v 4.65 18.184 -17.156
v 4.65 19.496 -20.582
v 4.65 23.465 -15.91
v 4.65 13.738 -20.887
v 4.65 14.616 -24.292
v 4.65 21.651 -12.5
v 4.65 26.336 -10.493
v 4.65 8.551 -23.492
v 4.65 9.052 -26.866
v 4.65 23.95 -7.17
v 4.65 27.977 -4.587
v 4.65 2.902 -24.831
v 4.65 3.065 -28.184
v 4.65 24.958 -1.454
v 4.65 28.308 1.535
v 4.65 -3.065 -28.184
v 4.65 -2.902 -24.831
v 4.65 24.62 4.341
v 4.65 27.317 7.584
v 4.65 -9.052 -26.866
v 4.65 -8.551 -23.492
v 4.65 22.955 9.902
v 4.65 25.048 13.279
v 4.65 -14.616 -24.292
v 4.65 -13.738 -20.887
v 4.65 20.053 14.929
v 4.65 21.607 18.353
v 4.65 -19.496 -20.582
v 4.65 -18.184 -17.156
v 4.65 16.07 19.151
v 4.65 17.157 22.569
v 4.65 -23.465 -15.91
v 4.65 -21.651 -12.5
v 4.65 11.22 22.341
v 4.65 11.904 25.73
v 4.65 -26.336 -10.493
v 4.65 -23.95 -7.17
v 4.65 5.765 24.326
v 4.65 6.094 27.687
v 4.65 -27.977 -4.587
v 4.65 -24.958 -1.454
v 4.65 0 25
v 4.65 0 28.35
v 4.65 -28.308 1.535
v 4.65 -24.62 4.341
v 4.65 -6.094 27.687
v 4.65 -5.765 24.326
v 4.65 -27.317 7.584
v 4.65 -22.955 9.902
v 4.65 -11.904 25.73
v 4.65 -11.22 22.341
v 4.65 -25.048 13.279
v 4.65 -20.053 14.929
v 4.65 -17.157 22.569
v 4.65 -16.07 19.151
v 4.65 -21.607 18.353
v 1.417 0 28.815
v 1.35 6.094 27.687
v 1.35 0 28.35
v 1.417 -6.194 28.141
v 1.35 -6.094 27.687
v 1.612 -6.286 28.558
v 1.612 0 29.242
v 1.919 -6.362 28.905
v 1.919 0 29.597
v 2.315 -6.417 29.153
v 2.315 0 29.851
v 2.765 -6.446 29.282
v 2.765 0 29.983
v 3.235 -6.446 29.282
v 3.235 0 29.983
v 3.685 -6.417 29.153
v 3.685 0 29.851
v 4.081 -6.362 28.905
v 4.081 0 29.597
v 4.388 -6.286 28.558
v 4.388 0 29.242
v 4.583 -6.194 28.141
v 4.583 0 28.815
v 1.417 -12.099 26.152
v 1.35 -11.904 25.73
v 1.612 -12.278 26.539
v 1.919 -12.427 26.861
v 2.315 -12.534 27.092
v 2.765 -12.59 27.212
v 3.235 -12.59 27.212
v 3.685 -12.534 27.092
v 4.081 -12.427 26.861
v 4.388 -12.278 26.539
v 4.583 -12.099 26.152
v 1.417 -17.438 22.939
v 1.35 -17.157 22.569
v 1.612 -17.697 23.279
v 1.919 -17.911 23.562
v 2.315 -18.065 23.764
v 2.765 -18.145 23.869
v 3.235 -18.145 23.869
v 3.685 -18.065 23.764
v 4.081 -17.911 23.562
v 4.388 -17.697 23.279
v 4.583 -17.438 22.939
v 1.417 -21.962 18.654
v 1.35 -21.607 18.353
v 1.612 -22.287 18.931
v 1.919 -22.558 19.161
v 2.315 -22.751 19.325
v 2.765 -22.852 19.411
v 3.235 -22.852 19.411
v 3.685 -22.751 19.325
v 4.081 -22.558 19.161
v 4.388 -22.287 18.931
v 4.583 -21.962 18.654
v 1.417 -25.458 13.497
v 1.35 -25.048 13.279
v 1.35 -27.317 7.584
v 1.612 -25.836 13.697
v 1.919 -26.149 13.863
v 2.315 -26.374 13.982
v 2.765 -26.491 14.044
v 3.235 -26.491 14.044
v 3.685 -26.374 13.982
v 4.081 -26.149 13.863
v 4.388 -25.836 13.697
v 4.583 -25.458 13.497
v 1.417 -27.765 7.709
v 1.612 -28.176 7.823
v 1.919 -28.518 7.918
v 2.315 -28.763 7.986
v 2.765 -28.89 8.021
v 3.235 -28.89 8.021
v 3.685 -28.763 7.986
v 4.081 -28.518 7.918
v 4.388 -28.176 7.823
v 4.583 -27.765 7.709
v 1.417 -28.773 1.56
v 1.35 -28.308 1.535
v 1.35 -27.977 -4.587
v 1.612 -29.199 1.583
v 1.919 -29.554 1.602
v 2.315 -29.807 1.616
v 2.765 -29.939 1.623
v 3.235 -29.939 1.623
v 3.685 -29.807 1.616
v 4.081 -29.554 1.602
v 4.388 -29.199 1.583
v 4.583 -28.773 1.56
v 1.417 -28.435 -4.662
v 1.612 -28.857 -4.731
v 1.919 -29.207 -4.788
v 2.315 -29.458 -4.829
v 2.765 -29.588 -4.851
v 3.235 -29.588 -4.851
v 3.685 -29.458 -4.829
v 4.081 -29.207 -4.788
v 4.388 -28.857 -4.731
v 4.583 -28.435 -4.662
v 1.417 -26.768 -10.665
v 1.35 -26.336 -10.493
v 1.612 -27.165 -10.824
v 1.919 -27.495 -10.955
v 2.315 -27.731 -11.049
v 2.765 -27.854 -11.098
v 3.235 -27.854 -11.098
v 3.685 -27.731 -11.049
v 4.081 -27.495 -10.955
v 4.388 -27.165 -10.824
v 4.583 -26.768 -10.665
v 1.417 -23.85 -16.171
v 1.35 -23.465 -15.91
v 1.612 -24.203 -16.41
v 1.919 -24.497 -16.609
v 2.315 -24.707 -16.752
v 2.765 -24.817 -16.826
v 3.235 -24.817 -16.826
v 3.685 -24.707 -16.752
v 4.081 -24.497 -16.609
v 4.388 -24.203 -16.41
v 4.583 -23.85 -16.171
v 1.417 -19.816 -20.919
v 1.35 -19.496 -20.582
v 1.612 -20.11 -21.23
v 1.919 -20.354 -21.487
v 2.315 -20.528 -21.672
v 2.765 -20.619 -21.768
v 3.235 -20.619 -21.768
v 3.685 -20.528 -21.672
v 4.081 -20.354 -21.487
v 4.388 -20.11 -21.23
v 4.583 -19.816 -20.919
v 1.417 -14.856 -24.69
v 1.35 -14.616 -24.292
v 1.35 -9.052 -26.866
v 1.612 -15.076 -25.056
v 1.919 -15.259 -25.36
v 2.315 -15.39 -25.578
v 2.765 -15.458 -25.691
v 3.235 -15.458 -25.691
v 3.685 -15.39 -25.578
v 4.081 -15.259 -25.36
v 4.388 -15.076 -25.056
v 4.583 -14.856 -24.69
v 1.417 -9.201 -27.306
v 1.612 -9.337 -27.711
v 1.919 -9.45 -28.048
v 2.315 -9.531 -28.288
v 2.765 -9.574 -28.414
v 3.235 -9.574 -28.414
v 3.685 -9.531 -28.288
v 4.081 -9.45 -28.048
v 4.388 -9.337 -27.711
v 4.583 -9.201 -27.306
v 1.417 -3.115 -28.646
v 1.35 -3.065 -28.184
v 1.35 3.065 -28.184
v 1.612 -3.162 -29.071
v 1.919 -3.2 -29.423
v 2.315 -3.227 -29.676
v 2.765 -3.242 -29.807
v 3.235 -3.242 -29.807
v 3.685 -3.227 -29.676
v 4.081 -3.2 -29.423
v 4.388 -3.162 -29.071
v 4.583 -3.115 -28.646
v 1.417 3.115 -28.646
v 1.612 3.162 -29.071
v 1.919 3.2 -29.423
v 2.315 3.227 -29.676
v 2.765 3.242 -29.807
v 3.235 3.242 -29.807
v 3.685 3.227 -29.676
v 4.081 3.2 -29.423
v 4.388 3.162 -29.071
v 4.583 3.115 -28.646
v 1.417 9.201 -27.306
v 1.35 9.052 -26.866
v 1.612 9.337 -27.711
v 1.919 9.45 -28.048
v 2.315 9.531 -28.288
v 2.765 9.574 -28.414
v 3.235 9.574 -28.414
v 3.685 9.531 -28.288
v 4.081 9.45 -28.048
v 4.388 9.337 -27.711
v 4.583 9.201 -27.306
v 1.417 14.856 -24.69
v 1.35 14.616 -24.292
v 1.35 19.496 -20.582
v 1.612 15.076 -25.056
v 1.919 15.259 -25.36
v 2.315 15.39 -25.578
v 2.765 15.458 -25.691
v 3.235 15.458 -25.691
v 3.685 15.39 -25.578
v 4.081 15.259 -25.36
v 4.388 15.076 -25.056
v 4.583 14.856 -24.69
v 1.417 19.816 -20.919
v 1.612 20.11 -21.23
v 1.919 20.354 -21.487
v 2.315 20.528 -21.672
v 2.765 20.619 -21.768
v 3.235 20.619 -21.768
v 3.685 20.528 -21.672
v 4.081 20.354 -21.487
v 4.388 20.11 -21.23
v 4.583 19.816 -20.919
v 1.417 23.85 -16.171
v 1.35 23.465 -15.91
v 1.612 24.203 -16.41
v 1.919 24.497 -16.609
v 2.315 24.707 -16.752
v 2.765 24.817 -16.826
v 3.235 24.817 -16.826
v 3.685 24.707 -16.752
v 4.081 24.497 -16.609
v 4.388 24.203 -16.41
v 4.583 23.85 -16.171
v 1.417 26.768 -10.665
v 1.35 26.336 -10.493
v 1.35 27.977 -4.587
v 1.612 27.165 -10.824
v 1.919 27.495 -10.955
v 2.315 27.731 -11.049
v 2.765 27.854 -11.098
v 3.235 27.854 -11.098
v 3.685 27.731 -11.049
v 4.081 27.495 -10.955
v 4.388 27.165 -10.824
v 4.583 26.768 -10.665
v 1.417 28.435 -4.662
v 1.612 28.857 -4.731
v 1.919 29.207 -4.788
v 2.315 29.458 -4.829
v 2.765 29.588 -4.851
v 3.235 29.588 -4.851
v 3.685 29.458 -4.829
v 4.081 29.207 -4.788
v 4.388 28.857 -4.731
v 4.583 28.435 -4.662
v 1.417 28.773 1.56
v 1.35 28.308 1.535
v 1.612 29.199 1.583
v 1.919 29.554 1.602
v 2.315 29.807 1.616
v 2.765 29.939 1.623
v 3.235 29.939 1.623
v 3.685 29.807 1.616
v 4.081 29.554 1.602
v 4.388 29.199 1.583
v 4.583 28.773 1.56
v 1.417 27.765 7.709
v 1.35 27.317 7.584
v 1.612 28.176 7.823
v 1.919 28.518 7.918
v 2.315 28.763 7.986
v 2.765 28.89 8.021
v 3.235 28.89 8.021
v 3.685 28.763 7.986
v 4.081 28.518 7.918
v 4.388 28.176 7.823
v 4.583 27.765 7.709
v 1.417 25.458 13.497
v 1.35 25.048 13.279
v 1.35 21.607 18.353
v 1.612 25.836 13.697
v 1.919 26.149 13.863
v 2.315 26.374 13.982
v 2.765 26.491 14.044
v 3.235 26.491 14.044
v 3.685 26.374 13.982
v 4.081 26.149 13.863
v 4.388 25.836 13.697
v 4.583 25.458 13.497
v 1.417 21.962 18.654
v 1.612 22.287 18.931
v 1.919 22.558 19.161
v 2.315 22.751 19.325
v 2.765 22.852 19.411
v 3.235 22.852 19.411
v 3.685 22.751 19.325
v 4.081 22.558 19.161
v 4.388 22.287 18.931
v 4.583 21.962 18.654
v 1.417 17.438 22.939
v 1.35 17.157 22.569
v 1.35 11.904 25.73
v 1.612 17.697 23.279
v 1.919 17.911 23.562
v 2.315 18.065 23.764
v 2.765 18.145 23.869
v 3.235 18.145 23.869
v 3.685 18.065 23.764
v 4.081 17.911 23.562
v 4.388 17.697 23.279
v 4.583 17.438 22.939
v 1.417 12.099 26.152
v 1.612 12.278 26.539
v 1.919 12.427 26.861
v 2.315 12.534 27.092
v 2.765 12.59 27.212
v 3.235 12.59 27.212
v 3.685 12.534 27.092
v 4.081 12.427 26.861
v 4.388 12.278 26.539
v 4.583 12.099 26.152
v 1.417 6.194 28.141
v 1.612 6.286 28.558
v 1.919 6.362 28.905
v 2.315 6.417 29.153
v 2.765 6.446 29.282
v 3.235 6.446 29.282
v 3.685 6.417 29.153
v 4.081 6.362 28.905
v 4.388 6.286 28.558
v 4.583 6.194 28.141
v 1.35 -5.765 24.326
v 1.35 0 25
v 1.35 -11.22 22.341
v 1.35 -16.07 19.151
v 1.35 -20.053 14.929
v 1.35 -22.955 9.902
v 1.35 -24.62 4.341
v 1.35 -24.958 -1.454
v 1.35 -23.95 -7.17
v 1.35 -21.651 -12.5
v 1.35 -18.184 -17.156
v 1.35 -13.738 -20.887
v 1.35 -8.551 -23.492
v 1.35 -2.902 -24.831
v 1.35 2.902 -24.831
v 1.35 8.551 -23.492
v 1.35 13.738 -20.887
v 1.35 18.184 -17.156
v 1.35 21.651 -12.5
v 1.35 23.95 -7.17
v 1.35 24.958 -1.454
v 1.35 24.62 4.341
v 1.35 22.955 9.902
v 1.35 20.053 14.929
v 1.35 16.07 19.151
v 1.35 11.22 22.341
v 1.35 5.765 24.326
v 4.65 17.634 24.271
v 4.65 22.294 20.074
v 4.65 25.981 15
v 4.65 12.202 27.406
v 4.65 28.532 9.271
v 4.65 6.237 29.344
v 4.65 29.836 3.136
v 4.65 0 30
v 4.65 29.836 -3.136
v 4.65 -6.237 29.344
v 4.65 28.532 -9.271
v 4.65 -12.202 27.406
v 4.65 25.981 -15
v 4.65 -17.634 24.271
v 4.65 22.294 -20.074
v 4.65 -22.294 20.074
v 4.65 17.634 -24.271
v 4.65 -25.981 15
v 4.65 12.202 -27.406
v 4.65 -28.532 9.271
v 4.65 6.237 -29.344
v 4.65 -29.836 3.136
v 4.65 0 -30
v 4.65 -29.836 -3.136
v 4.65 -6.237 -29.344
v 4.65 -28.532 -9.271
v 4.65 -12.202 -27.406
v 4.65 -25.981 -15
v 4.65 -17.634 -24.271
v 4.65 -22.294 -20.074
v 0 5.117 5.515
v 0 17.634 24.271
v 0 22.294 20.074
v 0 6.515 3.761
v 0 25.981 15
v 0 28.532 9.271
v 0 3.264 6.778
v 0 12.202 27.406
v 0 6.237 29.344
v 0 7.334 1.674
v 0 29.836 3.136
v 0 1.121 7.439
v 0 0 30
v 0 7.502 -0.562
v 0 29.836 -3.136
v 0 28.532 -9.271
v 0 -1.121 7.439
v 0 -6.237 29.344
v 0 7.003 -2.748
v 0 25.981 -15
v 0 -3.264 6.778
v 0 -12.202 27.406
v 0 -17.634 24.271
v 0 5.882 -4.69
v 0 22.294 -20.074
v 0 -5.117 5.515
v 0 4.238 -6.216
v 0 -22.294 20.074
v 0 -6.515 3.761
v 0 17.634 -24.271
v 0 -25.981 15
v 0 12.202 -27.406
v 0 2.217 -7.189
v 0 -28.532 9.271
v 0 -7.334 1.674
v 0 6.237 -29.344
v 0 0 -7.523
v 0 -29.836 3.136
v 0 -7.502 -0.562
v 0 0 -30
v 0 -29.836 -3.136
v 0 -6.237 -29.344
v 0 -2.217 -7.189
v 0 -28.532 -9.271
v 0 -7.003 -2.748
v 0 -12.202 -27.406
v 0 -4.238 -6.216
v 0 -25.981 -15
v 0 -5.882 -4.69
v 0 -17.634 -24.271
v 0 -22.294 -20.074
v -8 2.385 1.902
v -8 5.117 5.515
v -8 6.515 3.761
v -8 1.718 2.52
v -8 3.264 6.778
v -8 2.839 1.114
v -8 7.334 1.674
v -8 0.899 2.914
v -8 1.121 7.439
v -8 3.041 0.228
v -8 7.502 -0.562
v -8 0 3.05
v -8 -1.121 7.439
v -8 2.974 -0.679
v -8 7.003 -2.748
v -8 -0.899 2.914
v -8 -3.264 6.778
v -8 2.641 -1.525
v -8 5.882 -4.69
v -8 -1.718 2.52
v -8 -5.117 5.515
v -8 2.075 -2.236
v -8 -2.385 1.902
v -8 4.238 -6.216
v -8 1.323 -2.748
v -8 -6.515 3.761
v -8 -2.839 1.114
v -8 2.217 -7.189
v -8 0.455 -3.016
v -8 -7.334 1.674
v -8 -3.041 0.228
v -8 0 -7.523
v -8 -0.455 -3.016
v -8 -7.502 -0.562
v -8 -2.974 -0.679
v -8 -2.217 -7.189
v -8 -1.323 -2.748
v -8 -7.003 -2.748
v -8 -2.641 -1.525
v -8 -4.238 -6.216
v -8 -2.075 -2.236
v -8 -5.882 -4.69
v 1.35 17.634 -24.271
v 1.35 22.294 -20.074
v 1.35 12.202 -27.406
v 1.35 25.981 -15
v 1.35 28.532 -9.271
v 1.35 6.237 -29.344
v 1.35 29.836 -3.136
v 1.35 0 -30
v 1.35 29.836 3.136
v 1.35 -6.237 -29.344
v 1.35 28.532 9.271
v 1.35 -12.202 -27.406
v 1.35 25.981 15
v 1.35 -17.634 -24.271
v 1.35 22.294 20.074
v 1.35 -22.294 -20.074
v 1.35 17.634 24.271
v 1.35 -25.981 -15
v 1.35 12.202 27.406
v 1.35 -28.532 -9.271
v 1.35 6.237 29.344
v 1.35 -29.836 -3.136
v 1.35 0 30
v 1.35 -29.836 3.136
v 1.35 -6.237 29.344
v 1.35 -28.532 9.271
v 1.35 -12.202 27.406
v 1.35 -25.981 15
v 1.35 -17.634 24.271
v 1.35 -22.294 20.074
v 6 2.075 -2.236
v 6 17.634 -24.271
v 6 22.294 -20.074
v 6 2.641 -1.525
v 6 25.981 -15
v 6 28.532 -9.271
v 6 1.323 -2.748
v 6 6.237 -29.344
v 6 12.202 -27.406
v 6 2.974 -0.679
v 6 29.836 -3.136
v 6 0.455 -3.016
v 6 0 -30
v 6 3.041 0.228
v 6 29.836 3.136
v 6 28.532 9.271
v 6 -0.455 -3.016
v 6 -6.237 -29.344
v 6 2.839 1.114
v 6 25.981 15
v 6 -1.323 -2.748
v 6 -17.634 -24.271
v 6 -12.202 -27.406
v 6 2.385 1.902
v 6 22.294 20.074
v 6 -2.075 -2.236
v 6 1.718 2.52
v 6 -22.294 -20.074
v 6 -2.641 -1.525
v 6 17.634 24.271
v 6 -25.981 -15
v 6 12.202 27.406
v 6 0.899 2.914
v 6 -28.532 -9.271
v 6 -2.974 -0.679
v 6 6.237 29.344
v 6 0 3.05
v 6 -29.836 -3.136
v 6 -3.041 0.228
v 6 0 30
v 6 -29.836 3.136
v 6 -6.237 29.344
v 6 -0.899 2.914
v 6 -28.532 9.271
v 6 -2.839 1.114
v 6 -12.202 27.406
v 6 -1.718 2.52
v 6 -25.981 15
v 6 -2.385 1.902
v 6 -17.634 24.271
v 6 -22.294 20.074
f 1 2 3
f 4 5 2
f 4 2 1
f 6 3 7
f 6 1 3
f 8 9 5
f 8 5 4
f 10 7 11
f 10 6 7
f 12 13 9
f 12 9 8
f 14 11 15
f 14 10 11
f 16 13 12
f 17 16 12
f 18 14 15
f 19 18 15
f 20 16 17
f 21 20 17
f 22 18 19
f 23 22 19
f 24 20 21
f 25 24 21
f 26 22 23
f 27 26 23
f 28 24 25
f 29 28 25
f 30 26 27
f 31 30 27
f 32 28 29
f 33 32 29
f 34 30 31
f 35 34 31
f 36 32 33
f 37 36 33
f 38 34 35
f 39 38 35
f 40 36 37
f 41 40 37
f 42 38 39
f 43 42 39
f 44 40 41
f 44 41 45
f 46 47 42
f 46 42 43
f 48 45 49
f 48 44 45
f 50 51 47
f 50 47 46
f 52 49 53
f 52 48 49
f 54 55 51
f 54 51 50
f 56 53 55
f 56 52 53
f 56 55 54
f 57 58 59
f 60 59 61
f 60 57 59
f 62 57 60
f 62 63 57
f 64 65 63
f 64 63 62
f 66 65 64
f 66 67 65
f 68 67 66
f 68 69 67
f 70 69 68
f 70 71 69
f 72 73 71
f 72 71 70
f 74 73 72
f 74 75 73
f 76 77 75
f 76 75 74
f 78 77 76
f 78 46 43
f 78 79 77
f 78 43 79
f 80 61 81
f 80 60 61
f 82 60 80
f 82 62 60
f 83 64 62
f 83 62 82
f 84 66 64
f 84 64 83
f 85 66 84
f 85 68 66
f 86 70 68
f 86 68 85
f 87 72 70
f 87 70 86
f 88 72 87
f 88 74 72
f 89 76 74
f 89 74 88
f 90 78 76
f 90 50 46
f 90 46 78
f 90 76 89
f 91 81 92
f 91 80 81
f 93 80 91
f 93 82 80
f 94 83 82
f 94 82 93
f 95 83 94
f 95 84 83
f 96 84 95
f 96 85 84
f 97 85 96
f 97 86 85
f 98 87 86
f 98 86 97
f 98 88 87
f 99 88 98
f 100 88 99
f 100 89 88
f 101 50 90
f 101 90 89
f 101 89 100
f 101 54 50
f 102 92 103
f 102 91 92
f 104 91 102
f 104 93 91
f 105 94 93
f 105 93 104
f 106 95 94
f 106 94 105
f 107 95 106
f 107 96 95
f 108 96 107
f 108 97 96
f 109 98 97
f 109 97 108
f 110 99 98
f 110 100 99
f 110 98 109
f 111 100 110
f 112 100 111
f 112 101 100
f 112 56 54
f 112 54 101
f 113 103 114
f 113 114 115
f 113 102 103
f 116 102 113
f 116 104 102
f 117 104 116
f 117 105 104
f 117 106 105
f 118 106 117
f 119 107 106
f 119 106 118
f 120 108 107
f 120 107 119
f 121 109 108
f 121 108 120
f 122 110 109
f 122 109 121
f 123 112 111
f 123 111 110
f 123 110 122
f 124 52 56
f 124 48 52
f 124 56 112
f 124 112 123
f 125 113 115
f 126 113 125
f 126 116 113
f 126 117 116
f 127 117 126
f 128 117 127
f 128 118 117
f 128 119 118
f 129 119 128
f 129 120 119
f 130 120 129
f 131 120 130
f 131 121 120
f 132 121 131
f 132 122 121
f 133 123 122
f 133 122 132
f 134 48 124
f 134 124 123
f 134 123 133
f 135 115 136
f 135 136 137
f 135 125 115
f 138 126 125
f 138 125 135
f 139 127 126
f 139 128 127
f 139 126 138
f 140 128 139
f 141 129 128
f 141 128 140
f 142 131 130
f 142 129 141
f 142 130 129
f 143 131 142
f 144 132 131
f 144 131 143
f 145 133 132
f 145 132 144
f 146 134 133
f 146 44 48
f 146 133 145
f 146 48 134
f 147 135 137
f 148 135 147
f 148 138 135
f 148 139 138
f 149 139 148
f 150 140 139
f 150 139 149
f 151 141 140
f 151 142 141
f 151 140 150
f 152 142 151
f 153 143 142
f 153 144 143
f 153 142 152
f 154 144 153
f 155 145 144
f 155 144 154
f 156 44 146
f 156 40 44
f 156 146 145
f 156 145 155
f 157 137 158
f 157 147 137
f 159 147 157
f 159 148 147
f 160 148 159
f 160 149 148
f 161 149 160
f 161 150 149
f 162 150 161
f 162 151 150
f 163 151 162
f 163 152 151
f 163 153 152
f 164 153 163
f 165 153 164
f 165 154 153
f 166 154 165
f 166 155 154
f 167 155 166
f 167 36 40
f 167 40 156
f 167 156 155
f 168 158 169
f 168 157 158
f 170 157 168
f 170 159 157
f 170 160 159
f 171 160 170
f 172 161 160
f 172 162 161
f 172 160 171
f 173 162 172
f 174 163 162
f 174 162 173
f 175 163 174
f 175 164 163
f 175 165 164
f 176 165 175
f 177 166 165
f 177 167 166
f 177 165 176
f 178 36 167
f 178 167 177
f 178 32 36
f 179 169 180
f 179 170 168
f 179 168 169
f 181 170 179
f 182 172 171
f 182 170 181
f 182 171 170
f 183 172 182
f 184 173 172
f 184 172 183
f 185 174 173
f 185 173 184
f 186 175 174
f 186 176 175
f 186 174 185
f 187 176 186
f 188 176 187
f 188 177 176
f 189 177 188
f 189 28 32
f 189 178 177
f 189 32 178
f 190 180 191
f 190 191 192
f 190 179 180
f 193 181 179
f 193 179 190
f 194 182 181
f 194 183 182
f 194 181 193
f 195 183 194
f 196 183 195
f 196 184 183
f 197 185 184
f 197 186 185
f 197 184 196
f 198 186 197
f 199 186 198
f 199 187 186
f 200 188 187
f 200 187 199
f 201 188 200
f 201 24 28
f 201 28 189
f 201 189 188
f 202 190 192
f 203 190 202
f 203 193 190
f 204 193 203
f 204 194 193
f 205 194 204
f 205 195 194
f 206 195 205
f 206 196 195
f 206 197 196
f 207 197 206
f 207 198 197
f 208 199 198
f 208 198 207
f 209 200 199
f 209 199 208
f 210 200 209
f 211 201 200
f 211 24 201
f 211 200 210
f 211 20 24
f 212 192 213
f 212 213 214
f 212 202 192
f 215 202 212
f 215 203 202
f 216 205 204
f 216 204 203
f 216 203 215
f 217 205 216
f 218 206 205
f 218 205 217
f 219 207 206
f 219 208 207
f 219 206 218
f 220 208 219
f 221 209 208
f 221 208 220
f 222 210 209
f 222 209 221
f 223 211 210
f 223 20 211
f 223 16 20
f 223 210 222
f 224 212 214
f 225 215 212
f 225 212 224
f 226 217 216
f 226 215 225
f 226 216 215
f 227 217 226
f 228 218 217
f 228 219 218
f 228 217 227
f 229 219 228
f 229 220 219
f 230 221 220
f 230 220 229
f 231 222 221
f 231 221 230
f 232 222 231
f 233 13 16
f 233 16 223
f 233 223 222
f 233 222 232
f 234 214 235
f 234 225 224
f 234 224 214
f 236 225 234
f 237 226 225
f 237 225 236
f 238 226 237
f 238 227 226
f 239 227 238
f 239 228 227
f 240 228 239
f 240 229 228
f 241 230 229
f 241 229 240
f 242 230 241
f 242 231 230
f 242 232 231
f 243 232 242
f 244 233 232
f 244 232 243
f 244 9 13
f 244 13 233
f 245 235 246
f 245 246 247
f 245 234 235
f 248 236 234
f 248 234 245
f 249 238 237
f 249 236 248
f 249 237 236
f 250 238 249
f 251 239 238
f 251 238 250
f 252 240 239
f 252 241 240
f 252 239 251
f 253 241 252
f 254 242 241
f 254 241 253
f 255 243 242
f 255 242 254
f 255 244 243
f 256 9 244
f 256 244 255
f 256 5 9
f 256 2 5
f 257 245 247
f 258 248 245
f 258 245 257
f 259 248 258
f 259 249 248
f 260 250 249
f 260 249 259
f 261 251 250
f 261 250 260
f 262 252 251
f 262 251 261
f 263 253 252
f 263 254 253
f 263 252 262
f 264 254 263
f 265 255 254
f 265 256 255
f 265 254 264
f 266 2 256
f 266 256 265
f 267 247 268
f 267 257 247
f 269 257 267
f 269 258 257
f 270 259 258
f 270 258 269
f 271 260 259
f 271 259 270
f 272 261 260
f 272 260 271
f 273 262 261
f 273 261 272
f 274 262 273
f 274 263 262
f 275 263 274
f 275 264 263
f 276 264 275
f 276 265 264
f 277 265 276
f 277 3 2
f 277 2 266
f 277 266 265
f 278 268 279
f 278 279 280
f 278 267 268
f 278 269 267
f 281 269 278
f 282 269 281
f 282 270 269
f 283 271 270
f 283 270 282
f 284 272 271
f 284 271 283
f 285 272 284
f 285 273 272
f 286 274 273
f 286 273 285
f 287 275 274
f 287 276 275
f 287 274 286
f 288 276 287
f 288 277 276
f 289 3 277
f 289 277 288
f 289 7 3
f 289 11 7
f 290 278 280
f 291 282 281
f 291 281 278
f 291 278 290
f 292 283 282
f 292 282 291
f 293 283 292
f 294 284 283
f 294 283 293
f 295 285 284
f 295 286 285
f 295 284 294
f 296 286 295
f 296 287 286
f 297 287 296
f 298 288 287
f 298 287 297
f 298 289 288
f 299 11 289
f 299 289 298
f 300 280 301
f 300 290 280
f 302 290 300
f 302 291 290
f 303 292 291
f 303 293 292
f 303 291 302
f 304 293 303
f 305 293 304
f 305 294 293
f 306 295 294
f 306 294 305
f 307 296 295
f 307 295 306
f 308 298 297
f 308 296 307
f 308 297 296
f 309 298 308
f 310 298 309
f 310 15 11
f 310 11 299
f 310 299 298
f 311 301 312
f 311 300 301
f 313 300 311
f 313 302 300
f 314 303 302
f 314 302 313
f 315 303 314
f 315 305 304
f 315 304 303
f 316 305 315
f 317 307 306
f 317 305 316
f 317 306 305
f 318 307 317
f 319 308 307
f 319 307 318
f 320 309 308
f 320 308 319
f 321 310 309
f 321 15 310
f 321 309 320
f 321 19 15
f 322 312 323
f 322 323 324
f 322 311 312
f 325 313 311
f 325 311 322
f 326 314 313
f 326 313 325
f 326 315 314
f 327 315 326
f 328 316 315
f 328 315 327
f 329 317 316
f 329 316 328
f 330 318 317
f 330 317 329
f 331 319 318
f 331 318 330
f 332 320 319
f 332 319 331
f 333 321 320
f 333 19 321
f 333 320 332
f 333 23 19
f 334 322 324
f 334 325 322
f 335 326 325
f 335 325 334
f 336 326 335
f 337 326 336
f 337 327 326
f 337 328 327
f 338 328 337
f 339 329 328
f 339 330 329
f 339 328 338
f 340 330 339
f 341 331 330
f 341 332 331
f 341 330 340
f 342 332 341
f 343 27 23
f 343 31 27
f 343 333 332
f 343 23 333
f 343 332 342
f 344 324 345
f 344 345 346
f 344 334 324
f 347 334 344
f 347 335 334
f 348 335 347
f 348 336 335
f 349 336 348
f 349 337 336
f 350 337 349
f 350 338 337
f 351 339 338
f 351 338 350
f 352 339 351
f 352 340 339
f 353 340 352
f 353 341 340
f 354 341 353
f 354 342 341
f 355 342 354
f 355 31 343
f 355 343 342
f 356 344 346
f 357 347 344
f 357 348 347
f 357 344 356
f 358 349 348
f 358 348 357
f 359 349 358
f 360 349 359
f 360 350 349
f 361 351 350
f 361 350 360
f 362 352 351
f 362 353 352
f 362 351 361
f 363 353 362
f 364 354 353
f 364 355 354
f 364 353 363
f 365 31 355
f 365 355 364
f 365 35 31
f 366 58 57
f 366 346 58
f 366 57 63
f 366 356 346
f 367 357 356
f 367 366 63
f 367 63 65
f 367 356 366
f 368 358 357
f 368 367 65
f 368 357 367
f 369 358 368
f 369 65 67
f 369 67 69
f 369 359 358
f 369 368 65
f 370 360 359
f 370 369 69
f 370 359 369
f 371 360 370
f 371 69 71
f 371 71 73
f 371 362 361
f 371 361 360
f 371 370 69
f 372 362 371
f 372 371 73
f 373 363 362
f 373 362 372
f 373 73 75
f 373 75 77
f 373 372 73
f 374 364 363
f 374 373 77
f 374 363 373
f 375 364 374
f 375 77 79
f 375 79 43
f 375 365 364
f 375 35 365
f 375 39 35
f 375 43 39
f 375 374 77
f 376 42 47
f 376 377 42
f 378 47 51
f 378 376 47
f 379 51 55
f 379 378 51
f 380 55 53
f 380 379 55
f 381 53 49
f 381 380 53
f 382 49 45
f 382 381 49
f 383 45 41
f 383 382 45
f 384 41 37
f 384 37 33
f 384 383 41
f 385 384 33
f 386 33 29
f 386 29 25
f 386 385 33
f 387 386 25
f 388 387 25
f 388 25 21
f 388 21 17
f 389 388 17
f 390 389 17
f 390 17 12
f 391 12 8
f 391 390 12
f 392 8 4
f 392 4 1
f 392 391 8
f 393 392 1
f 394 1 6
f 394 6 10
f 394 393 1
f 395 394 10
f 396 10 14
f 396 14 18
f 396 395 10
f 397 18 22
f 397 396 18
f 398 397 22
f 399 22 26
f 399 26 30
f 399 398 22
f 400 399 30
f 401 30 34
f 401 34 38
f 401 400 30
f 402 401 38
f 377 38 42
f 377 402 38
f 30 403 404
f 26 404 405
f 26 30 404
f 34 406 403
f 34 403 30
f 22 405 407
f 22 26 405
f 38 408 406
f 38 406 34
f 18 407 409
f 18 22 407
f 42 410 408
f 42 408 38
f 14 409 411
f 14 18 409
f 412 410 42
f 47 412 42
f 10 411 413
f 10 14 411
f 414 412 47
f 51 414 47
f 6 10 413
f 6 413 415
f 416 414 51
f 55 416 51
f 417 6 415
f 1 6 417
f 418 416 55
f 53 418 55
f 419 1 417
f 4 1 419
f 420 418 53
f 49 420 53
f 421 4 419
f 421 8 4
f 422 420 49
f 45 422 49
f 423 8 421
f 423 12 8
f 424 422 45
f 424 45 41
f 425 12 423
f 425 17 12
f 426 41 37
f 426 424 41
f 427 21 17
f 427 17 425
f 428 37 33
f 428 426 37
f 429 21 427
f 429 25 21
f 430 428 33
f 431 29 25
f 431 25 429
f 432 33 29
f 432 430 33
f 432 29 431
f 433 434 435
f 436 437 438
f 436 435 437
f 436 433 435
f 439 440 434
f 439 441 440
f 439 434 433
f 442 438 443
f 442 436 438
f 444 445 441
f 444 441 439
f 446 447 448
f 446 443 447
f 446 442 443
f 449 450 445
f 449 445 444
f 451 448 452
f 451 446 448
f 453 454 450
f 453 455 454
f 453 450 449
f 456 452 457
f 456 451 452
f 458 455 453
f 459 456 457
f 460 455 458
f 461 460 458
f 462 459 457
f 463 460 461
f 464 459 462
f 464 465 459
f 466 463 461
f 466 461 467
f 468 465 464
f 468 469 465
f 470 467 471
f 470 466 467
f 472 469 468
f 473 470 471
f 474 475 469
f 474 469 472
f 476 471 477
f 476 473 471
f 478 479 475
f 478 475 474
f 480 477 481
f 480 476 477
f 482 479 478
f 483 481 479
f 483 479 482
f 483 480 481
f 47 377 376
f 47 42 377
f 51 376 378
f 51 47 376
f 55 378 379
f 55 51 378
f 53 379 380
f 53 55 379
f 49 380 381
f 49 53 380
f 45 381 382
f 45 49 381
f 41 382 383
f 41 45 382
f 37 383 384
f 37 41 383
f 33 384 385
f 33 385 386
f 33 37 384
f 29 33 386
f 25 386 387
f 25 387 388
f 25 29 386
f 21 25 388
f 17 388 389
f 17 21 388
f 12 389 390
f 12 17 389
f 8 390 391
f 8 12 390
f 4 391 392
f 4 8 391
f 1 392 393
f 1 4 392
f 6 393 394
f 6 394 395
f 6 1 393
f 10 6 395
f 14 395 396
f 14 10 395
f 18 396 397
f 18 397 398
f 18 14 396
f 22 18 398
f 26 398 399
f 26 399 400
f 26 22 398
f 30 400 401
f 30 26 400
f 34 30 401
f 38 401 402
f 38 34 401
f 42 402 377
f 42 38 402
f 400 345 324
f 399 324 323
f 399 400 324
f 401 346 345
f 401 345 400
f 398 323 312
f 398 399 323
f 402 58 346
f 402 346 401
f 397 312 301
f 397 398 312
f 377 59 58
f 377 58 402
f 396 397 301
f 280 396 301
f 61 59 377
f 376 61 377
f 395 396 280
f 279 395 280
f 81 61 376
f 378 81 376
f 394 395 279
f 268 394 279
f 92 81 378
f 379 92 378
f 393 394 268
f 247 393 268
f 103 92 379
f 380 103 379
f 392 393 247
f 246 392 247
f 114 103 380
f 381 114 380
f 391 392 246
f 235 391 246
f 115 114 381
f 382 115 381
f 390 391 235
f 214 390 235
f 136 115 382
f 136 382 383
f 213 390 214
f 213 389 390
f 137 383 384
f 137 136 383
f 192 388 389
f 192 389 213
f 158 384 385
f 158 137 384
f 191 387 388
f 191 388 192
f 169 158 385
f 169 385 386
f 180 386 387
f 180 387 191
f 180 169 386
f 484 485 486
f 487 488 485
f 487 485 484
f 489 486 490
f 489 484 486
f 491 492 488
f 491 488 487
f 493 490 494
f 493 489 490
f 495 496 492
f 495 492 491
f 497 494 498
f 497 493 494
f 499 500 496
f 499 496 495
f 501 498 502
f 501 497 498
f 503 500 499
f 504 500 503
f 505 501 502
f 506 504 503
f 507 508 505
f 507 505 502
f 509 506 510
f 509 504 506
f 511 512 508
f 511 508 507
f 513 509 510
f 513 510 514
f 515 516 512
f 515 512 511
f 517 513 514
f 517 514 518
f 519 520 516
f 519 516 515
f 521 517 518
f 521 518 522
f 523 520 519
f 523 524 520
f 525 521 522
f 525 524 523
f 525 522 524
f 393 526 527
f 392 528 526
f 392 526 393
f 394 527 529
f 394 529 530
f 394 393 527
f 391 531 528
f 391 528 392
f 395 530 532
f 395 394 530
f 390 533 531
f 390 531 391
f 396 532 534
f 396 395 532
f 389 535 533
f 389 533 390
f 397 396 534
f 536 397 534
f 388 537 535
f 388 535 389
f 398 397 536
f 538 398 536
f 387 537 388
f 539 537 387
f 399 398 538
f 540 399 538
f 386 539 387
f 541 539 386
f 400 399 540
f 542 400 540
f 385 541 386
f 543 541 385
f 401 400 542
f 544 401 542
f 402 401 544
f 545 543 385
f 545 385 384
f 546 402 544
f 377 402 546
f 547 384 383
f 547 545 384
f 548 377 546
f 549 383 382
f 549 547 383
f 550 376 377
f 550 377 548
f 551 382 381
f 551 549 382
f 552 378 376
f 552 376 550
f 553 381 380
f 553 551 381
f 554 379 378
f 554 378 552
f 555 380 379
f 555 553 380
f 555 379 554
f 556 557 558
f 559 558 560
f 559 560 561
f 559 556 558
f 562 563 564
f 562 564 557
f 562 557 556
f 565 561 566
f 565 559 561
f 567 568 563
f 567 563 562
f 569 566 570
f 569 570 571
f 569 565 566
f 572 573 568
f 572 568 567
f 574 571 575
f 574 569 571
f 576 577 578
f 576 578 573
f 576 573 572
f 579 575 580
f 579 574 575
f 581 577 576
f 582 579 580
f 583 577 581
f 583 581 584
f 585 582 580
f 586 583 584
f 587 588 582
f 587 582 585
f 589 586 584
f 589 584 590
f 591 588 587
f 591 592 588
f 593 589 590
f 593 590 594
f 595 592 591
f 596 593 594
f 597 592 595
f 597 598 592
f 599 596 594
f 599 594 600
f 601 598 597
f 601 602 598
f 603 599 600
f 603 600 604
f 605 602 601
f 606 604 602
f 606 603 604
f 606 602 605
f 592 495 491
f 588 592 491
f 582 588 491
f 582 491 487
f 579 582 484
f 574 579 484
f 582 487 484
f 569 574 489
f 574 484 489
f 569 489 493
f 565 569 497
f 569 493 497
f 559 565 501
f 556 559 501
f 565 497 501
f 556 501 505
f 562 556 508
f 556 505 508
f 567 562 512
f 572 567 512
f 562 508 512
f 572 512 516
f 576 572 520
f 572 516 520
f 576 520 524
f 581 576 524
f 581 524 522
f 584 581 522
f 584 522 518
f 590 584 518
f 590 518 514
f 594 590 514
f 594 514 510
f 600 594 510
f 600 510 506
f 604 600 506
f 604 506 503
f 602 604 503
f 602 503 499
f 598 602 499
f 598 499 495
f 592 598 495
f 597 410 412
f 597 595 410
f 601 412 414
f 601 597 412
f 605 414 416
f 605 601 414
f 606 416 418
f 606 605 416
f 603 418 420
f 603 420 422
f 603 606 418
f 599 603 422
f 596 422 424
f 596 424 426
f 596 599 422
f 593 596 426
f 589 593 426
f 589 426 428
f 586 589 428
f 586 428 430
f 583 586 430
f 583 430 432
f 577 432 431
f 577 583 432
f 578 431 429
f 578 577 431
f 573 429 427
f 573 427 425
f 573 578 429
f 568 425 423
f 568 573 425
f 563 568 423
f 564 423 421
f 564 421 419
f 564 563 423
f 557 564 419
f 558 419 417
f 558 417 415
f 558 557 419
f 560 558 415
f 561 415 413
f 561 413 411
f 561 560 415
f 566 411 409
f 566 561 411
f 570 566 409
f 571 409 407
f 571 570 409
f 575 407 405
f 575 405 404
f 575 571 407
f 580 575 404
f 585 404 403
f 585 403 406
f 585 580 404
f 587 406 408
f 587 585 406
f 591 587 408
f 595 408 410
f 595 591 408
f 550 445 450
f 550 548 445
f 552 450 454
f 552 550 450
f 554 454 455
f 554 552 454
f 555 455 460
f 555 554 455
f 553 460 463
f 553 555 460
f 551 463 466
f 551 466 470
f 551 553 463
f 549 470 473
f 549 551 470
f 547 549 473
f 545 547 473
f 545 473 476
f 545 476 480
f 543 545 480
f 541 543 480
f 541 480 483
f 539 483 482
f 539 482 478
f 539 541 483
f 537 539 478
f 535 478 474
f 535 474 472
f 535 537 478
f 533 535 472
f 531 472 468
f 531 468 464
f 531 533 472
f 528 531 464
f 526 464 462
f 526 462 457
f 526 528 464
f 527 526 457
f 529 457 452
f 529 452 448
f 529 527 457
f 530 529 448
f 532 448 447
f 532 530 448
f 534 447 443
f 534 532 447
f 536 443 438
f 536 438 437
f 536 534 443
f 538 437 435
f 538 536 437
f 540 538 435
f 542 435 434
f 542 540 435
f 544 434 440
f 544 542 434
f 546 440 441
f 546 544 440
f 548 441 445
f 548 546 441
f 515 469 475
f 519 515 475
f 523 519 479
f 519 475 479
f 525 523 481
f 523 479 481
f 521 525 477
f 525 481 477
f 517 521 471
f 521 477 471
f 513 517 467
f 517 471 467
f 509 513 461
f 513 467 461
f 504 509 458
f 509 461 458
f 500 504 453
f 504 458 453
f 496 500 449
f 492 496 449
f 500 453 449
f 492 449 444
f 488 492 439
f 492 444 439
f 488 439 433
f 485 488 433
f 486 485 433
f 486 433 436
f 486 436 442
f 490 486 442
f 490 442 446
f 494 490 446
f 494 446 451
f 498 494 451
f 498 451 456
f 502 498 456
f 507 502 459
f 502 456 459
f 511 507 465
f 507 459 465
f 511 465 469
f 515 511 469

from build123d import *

# Parameters (mm, degrees)
ESQUISSE3_R             = 7.522774239
BOSS_EXTRU_1_DEPTH      = 8
ESQUISSE4_R             = 3.05
ENL_V_MAT_EXTRU_1_DEPTH = 45.676615942


with BuildPart() as part:
    # Esquisse1 → Révolution1 (revolve)
    with BuildSketch(Plane.XY, mode=Mode.PRIVATE) as r_volution1_sk:
        Polygon((1.35, 30), (1.35, 25), (4.65, 25), (4.65, 30), (6, 30), (6, 0), (0, 0), (0, 30), align=None)
    revolve(r_volution1_sk.sketch.rotate(Axis((0, 0, 0), (1, 0, 0)), 90), axis=Axis((0, 0, 0), (1, 0, 0)))

    # Esquisse3 → Boss.-Extru.1 (add)
    with BuildSketch(Plane.ZY):
        with Locations(Location((0, 0, 0), (0, 0, 180))):
            Circle(ESQUISSE3_R)
    extrude(amount=BOSS_EXTRU_1_DEPTH)

    # Esquisse4 → Enlèv. mat.-Extru.1 (cut, through all)
    with BuildSketch(Plane.ZY.offset(8)):
        Circle(ESQUISSE4_R)
    extrude(amount=-ENL_V_MAT_EXTRU_1_DEPTH, mode=Mode.SUBTRACT)


with BuildPart() as body_2:
    # Esquisse2 → Révolution2 (revolve)
    with BuildSketch(Plane.XY, mode=Mode.PRIVATE) as r_volution2_sk:
        with BuildLine():
            Line((4.65, 25), (1.35, 25))
            Line((1.35, 25), (1.35, 28.35))
            ThreePointArc((1.35, 28.35), (3, 30), (4.65, 28.35))
            Line((4.65, 28.35), (4.65, 25))
        make_face()
    revolve(r_volution2_sk.sketch.rotate(Axis((-10.330885644, 0, 0), (1, 0, 0)), 90), axis=Axis((-10.330885644, 0, 0), (1, 0, 0)))


solid = Compound([part.part, body_2.part])
